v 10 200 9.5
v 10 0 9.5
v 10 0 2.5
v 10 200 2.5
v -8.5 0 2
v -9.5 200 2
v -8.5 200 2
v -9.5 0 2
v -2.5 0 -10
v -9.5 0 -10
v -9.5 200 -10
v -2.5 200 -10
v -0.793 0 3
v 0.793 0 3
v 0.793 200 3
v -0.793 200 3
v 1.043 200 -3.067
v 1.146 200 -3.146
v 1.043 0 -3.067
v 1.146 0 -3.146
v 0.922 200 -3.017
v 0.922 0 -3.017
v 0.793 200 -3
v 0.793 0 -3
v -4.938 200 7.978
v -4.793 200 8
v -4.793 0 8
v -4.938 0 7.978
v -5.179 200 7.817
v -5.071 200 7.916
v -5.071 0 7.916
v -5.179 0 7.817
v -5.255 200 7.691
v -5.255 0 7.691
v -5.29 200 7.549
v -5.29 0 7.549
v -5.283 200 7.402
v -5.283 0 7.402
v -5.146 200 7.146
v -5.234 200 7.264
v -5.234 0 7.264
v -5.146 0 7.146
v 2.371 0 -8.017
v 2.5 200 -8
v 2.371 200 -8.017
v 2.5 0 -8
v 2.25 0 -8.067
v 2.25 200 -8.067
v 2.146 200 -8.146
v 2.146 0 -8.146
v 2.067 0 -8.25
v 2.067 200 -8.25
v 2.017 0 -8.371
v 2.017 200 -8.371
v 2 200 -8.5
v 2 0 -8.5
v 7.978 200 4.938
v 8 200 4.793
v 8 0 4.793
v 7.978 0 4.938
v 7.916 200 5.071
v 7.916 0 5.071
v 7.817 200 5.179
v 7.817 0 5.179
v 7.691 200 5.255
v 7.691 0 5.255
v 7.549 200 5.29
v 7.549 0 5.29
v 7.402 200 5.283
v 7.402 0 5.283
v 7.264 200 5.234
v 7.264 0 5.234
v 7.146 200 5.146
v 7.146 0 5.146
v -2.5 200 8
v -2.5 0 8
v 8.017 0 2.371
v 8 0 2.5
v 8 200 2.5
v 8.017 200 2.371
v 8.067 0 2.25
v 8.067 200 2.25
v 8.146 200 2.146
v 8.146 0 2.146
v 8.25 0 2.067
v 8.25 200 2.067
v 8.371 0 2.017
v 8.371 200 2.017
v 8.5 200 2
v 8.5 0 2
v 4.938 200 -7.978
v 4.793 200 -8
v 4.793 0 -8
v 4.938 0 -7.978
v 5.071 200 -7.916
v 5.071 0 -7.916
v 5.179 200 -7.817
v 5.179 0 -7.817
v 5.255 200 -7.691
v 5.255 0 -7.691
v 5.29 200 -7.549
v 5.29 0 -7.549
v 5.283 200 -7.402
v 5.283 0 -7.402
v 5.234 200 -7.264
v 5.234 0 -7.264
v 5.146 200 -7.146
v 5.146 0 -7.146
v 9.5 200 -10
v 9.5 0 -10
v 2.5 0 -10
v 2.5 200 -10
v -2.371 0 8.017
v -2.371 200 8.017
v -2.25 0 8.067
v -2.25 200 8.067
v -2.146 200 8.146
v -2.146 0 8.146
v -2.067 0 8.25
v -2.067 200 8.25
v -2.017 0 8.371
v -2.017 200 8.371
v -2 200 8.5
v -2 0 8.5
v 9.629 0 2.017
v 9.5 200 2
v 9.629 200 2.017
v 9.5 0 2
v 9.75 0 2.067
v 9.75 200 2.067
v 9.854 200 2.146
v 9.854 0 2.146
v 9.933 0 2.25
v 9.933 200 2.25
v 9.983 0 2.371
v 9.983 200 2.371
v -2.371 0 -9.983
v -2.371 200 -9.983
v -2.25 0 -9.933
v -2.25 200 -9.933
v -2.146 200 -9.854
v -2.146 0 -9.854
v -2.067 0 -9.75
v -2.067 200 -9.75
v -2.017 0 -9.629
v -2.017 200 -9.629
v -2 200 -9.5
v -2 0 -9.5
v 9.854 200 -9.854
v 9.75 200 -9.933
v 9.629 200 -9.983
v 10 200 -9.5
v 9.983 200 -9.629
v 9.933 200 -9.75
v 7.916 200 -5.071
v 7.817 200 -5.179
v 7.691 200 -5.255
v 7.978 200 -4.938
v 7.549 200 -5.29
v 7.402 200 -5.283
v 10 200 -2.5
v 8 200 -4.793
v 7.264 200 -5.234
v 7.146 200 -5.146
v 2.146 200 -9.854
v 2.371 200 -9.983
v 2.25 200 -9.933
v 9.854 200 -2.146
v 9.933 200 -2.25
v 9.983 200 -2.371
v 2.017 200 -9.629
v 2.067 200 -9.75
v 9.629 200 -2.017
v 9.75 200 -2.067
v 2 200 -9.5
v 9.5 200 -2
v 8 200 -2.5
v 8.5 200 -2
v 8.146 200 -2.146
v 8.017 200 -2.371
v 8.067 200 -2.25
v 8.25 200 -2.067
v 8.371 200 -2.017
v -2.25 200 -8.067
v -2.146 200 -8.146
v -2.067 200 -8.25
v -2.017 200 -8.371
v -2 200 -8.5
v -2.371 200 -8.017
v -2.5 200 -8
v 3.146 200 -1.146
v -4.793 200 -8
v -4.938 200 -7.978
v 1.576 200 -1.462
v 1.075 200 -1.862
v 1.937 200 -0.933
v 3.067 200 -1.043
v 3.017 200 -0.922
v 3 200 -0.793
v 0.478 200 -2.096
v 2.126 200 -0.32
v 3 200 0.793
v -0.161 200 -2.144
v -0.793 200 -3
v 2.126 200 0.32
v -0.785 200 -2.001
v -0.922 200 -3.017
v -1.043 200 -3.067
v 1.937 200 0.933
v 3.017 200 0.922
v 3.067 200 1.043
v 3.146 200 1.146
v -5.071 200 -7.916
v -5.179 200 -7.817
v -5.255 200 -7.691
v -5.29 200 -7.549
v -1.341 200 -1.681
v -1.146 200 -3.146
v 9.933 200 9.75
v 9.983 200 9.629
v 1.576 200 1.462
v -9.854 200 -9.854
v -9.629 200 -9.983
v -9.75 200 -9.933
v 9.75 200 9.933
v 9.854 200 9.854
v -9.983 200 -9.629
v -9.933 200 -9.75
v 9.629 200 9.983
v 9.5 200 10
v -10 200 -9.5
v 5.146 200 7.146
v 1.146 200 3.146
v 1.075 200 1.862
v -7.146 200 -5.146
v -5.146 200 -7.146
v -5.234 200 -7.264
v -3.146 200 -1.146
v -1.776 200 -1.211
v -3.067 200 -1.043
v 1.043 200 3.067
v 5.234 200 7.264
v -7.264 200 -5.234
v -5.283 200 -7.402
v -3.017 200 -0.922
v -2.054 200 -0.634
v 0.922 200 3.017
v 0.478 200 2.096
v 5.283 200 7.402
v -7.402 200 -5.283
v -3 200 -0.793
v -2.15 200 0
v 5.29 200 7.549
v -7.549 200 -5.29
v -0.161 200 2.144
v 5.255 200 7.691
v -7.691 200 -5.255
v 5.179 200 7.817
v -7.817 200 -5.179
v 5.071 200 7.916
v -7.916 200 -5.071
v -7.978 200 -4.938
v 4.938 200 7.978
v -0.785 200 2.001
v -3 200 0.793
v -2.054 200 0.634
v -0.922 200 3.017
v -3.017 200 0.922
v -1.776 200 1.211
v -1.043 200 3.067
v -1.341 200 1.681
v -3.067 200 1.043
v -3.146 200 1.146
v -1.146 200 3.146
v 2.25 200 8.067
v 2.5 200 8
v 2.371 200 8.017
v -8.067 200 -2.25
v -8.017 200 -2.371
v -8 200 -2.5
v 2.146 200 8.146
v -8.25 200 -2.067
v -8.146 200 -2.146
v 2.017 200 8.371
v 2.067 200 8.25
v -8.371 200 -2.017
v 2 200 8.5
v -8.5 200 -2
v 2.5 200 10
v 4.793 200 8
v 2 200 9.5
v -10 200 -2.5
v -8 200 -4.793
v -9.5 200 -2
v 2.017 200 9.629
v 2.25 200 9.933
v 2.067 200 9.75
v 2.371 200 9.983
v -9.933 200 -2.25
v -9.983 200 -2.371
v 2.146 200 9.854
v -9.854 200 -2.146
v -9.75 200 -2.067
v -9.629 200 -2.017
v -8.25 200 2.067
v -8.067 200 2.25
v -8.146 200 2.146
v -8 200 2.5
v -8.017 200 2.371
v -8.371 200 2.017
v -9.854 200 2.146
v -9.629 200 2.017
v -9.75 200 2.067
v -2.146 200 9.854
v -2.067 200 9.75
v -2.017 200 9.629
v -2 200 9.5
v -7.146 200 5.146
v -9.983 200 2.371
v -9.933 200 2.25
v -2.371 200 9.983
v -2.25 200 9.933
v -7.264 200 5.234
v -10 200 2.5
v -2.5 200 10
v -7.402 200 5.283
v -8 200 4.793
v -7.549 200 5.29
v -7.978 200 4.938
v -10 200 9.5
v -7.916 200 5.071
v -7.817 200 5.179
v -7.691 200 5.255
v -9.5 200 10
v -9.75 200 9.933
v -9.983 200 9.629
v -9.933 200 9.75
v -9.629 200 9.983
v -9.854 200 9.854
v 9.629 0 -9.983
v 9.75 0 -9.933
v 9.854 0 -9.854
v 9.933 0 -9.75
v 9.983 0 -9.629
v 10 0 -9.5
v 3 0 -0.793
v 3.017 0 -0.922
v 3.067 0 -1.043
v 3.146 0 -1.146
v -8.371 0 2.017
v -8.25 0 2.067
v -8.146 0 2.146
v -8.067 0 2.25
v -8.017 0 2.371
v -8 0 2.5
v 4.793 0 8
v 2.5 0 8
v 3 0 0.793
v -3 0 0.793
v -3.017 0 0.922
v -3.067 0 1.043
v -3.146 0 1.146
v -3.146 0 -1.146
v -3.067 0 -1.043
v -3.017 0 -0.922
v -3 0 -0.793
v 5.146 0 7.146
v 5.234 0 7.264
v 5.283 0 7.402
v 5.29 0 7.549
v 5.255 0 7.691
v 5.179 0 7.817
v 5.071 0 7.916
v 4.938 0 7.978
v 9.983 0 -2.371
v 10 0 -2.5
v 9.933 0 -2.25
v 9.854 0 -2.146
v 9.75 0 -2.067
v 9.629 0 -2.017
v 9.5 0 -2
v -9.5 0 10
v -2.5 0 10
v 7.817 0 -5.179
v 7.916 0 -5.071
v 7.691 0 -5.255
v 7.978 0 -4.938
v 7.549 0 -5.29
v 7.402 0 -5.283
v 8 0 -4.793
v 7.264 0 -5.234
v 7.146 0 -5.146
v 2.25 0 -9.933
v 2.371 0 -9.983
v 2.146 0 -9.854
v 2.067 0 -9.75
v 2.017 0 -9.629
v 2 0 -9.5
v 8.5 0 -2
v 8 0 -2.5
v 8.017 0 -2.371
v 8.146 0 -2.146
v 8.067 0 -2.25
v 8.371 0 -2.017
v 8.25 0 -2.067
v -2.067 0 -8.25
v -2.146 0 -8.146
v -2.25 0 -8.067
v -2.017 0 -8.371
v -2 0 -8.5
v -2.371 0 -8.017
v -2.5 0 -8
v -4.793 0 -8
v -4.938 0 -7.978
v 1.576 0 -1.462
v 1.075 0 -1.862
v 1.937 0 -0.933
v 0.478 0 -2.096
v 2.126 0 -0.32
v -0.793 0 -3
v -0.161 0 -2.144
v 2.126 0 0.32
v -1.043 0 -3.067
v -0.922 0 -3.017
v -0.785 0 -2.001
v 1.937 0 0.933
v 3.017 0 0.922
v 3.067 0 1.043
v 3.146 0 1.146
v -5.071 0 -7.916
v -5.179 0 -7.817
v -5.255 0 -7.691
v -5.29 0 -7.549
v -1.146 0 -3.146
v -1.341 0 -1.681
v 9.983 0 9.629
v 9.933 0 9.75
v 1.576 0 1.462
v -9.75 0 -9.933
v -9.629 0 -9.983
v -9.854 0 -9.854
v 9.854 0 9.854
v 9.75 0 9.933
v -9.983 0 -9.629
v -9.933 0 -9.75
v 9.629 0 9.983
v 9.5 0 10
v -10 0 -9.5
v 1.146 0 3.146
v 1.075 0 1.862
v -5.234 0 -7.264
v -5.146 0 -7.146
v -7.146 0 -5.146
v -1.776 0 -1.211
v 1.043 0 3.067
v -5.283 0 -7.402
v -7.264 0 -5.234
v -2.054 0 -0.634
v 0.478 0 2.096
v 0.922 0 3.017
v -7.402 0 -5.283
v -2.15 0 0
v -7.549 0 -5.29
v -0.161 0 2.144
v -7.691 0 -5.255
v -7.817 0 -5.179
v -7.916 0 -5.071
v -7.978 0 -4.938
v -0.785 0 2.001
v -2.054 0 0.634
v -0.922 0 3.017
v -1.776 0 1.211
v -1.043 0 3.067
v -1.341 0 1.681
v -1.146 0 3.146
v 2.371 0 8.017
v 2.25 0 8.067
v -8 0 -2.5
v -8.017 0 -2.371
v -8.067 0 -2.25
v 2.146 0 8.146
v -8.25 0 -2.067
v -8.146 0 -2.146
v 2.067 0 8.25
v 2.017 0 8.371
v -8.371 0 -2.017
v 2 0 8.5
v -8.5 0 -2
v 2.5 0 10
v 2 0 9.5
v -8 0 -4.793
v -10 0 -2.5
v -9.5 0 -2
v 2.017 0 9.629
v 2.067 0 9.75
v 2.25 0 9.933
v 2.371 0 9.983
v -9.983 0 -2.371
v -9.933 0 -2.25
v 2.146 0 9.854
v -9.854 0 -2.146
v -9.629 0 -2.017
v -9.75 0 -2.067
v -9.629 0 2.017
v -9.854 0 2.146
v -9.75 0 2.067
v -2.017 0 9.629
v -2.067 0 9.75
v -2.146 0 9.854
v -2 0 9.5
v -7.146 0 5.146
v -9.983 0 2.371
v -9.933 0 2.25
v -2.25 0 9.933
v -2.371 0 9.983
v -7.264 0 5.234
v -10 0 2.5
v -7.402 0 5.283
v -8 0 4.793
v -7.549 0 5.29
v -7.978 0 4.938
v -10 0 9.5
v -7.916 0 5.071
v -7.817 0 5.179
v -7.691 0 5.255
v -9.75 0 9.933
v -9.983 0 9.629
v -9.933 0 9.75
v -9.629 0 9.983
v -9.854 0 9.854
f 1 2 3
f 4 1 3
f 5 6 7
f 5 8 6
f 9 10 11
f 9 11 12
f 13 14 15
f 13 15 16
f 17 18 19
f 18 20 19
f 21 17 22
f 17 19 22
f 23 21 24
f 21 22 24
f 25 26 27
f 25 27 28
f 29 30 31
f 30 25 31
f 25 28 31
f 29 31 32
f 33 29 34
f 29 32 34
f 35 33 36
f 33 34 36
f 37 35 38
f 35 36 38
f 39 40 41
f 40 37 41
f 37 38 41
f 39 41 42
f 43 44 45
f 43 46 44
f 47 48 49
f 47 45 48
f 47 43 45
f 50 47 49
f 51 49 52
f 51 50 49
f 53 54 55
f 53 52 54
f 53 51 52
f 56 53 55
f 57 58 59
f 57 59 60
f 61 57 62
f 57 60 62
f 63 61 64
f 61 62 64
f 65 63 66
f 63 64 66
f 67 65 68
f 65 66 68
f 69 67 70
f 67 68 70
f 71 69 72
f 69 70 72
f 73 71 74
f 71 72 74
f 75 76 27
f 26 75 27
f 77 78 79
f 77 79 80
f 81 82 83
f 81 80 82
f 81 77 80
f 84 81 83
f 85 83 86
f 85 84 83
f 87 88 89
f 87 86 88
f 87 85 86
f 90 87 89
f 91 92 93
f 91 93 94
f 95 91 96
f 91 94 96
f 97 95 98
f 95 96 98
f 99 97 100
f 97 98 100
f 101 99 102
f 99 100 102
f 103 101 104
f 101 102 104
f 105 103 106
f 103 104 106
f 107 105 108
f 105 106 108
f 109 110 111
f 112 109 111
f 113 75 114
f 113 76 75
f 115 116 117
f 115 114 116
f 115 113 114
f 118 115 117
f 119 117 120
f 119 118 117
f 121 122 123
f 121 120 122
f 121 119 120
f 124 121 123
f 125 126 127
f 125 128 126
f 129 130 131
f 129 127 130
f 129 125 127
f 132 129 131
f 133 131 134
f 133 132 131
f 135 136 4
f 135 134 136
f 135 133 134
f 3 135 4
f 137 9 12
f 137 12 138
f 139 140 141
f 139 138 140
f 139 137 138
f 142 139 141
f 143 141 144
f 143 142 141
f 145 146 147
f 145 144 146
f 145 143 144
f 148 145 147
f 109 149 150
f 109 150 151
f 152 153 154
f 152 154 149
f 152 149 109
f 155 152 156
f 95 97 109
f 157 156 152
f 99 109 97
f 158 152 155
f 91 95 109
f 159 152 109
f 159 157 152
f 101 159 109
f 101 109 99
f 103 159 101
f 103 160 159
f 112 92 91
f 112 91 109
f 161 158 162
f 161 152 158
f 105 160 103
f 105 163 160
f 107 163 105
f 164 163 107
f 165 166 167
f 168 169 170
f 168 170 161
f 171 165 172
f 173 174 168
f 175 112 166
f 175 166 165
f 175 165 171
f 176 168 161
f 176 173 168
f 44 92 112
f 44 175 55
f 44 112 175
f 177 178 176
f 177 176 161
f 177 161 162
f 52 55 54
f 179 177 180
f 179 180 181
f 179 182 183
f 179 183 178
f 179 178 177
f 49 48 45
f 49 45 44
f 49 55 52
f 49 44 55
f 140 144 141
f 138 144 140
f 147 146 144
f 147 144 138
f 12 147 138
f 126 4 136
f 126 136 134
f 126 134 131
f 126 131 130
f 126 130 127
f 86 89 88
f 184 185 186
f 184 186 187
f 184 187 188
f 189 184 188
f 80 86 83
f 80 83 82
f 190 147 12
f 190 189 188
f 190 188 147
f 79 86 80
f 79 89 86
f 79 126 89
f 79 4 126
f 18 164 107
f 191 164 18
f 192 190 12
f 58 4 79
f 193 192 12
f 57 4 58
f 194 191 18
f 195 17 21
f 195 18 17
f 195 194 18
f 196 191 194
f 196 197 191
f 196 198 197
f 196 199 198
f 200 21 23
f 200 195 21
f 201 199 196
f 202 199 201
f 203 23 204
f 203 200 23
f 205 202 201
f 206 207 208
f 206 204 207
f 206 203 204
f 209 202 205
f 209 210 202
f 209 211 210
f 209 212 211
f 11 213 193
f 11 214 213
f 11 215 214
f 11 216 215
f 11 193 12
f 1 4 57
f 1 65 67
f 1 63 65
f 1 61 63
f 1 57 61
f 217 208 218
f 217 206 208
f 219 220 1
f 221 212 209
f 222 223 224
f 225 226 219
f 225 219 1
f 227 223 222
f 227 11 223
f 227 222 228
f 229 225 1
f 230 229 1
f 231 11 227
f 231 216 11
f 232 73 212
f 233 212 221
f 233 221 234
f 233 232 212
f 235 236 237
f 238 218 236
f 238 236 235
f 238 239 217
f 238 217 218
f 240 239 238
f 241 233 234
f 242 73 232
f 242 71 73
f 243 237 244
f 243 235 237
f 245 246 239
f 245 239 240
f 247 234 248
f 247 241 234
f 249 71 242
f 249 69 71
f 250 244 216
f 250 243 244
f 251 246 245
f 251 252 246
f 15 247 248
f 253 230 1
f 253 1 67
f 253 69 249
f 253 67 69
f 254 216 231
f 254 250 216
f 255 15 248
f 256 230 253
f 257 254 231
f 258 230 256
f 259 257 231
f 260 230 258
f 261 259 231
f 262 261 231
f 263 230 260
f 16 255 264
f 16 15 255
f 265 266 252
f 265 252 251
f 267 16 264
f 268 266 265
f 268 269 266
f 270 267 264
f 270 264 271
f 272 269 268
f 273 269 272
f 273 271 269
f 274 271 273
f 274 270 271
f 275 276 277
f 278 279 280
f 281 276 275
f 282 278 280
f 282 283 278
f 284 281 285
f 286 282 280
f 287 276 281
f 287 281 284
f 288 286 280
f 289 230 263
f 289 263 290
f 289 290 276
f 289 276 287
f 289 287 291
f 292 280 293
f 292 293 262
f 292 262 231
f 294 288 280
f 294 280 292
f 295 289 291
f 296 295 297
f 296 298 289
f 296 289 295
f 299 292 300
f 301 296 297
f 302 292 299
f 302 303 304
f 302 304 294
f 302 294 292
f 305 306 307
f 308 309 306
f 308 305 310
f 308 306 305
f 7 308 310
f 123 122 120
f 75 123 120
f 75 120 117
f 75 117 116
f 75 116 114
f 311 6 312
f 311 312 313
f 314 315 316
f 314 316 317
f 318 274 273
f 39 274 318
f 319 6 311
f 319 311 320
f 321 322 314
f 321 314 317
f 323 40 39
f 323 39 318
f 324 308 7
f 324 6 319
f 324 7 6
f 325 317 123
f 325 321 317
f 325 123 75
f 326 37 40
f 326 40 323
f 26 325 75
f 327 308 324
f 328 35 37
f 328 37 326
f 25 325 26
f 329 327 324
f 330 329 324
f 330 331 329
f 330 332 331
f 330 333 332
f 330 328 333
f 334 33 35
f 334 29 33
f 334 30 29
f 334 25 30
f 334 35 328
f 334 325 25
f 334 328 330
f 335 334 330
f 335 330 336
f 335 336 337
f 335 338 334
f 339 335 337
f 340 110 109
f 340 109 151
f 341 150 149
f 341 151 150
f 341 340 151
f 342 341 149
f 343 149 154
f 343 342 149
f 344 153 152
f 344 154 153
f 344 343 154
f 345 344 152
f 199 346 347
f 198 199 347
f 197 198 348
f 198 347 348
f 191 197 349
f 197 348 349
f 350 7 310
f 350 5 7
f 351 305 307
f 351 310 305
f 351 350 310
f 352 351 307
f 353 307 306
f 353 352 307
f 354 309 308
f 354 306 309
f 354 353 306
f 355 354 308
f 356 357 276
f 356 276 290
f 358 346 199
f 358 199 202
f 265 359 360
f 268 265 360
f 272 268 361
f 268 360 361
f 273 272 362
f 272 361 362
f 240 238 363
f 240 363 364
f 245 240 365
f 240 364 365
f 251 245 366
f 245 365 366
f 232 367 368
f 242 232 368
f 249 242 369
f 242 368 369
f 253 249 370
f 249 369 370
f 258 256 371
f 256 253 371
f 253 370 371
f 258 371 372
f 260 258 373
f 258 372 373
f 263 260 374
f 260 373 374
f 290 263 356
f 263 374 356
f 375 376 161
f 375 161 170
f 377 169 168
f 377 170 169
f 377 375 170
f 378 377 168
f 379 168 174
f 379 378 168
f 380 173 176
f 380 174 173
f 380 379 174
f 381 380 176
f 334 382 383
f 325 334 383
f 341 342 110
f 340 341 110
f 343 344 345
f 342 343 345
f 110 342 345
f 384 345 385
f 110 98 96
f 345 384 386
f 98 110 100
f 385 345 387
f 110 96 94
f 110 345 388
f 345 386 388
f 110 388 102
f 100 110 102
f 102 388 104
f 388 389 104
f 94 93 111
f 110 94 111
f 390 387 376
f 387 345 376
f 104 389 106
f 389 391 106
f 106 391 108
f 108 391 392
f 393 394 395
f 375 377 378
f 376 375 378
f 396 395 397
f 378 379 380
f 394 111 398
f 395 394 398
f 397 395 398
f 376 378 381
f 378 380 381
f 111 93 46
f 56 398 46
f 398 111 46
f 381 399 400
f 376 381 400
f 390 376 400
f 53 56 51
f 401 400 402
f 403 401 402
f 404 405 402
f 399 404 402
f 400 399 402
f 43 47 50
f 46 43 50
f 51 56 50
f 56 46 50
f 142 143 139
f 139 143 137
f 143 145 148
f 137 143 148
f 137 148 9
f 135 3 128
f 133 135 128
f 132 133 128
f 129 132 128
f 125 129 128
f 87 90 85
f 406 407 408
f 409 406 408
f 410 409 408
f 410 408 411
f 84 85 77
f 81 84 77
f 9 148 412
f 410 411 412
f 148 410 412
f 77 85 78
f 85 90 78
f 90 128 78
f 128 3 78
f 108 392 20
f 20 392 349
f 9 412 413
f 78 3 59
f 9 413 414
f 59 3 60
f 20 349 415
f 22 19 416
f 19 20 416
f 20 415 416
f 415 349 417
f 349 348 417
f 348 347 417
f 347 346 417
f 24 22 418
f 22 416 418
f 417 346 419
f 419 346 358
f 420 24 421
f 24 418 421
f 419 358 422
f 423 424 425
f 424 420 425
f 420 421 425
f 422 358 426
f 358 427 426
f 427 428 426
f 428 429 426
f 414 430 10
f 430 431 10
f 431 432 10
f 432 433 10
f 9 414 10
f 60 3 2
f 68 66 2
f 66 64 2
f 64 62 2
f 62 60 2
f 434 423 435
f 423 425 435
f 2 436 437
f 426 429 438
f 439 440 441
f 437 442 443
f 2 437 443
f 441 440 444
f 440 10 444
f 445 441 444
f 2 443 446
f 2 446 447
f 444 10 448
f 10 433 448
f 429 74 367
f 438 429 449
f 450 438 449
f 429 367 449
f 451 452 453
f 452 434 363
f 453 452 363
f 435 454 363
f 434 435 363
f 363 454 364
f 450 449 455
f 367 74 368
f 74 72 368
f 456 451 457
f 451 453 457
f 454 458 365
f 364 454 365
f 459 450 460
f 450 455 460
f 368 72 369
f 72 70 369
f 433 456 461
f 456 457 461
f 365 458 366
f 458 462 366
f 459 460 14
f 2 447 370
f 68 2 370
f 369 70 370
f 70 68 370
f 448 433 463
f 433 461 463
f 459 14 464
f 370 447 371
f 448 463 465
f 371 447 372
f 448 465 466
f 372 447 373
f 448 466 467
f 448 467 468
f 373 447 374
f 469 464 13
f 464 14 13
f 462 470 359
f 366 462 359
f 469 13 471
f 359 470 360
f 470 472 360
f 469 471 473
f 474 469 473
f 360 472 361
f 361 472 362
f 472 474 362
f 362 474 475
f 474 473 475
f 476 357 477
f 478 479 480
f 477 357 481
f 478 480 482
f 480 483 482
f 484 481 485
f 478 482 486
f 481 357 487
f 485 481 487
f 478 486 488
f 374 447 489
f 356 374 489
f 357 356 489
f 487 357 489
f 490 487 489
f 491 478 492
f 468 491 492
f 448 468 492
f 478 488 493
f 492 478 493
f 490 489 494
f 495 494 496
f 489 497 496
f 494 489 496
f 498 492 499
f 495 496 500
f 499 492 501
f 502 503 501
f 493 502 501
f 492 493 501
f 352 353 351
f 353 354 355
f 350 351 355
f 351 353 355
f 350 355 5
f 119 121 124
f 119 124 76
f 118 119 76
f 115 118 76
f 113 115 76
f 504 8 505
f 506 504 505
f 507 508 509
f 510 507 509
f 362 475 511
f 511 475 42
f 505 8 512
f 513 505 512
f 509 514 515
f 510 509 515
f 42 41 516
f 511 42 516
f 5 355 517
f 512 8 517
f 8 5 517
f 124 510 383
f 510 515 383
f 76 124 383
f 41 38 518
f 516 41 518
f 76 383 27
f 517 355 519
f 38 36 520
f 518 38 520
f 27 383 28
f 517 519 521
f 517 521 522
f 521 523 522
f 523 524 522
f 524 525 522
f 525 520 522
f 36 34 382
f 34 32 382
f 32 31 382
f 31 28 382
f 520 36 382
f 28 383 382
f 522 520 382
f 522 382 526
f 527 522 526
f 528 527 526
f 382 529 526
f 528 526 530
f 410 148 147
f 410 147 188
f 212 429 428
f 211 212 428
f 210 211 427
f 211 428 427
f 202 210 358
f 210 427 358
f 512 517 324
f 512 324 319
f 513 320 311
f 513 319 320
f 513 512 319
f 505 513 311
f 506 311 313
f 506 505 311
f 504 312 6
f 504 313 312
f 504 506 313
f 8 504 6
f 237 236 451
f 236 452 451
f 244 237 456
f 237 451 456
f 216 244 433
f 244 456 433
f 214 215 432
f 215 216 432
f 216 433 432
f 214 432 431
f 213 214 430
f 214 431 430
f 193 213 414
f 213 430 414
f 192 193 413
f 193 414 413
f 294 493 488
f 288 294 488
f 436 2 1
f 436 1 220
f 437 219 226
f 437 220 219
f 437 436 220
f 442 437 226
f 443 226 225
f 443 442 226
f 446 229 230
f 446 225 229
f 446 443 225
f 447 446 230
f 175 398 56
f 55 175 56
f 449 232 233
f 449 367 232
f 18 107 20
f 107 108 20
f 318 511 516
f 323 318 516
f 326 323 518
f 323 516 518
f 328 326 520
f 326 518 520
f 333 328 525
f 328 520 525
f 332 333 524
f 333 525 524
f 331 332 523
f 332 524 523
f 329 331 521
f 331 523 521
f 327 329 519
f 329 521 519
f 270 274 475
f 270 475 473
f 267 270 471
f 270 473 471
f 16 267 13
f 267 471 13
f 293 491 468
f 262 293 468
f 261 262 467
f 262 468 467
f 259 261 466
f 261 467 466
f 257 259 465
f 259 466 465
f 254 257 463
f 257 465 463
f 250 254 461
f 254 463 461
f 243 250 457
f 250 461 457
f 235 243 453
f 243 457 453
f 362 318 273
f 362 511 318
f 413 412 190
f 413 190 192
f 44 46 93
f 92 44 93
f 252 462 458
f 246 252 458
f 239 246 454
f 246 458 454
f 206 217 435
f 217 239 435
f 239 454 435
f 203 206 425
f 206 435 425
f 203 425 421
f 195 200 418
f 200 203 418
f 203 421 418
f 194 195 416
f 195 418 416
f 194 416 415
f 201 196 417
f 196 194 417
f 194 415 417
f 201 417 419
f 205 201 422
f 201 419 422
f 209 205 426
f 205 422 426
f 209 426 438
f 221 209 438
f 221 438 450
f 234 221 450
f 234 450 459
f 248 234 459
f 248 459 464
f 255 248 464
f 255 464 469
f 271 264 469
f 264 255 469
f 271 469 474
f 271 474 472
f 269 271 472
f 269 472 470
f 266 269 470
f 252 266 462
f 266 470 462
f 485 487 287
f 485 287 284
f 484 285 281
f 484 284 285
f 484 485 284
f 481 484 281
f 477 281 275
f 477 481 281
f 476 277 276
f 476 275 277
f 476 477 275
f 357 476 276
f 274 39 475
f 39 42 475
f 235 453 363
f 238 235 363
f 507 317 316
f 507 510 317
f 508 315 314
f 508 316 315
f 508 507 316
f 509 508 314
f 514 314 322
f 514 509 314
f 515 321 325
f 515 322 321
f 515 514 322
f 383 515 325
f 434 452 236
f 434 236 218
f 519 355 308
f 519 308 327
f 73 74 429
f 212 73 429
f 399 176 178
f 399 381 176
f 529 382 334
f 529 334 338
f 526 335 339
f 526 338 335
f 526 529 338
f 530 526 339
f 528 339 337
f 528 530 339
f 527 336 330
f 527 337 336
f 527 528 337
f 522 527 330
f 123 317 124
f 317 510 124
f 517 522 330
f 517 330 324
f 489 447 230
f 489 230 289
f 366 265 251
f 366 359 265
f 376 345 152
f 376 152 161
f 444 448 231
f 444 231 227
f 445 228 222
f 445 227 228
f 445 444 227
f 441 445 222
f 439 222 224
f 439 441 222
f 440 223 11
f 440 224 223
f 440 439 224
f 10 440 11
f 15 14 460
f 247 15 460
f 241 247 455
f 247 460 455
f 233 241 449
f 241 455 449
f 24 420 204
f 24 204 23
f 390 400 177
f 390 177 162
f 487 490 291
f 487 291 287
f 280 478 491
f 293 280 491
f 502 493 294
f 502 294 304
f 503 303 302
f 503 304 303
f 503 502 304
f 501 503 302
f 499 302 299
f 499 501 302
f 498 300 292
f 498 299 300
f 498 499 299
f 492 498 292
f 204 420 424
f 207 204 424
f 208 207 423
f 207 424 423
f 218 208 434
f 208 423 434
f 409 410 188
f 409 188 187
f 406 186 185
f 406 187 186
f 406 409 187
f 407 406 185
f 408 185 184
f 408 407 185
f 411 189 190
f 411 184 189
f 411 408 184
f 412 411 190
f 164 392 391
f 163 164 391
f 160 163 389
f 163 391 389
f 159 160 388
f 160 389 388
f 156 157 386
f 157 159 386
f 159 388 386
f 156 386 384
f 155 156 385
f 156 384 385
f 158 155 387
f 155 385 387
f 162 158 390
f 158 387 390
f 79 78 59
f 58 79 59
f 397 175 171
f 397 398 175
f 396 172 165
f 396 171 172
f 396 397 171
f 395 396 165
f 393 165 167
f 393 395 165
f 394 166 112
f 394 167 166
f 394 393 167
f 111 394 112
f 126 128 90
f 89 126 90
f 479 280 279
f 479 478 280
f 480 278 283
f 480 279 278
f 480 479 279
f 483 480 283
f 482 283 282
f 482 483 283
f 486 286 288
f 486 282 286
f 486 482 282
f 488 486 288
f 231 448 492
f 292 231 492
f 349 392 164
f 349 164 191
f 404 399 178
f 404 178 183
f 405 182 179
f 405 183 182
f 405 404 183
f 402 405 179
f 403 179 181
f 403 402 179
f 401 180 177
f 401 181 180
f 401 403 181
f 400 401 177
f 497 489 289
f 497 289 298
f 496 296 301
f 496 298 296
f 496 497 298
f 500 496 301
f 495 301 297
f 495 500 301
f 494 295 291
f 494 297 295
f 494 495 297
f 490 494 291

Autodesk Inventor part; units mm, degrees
ref_plane "YZ Plane" through (0, 0, 0) normal (1, 0, 0) x (0, 1, 0)
ref_plane "XZ Plane" through (0, 0, 0) normal (0, 1, 0) x (-1, 0, 0)
ref_plane "XY Plane" through (0, 0, 0) normal (0, 0, 1) x (1, 0, 0)
sketch "Sketch1" plane through (0, 0, 0) normal (0, 1, 0) x (-1, 0, 0)
  line L0 (2.5, 10) -> (9.5, 10) construction
  line L1 (10, -2.5) -> (10, -9.5) construction
  line L2 (-2.5, -10) -> (-9.5, -10) construction
  line L3 (-10, 2.5) -> (-10, 10) construction
  line L4 (-10, 10) -> (10, -10) construction
  line L5 (10, 10) -> (-10, -10) construction
  circle A0 centre (0, 0) radius 2.15
  line L6 (10, 9.5) -> (10, 2.5)
  line L7 (9.5, 2) -> (8.5, 2)
  line L8 (8, 2.5) -> (8, 4.7929)
  line L9 (-0.7929, 3) -> (0.7929, 3)
  line L10 (3, 0.7929) -> (3, -0.7929)
  line L11 (0.7929, -3) -> (-0.7929, -3)
  line L12 (-3, -0.7929) -> (-3, 0.7929)
  line L13 (-3, 3) -> (3, -3) construction
  line L14 (3, 3) -> (-3, -3) construction
  line L15 (10, -10) -> (10, -2)
  line L16 (9.5, -2) -> (8.5, -2)
  line L17 (8, -2.5) -> (8, -4.7929)
  line L18 (7.1464, -5.1464) -> (3.1464, -1.1464)
  line L19 (7.1464, 5.1464) -> (3.1464, 1.1464)
  line L20 (8, 6) -> (13.6569, 6) construction
  line L21 (10, 10) -> (2, 10)
  line L22 (2, 9.5) -> (2, 8.5)
  line L23 (2.5, 8) -> (4.7929, 8)
  line L24 (5.1464, 7.1464) -> (1.1464, 3.1464)
  line L25 (-9.5, 10) -> (-2.5, 10)
  line L26 (-2, 9.5) -> (-2, 8.5)
  line L27 (-2.5, 8) -> (-4.7929, 8)
  line L28 (-5.1464, 7.1464) -> (-1.1464, 3.1464)
  line L29 (-10, 9.5) -> (-10, 2)
  line L30 (-9.5, 2) -> (-8.5, 2)
  line L31 (-8, 2.5) -> (-8, 4.7929)
  line L32 (-7.1464, 5.1464) -> (-3.1464, 1.1464)
  line L33 (-10, -9.5) -> (-10, -2.5)
  line L34 (-9.5, -2) -> (-8.5, -2)
  line L35 (-8, -2.5) -> (-8, -4.7929)
  line L36 (-7.1464, -5.1464) -> (-3.1464, -1.1464)
  line L37 (-8, -6) -> (-2.3431, -6) construction
  line L38 (-10, -10) -> (-2, -10)
  line L39 (-2, -9.5) -> (-2, -8.5)
  line L40 (-2.5, -8) -> (-4.7929, -8)
  line L41 (-5.1464, -7.1464) -> (-1.1464, -3.1464)
  line L42 (9.5, -10) -> (2.5, -10)
  line L43 (2, -9.5) -> (2, -8.5)
  line L44 (2.5, -8) -> (4.7929, -8)
  line L45 (5.1464, -7.1464) -> (1.1464, -3.1464)
  arc A1 (8, 2.5) -> (8.5, 2) centre (8.5, 2.5) ccw
  arc A2 (9.5, 2) -> (10, 2.5) centre (9.5, 2.5) ccw
  arc A3 (10, -2.5) -> (9.5, -2) centre (9.5, -2.5) ccw
  arc A4 (8.5, -2) -> (8, -2.5) centre (8.5, -2.5) ccw
  arc A5 (7.1464, -5.1464) -> (8, -4.7929) centre (7.5, -4.7929) ccw
  arc A6 (3, -0.7929) -> (3.1464, -1.1464) centre (3.5, -0.7929) ccw
  arc A7 (3.1464, 1.1464) -> (3, 0.7929) centre (3.5, 0.7929) ccw
  arc A8 (8, 4.7929) -> (7.1464, 5.1464) centre (7.5, 4.7929) ccw
  arc A9 (5.1464, 7.1464) -> (4.7929, 8) centre (4.7929, 7.5) ccw
  arc A10 (0.7929, 3) -> (1.1464, 3.1464) centre (0.7929, 3.5) ccw
  arc A11 (-1.1464, 3.1464) -> (-0.7929, 3) centre (-0.7929, 3.5) ccw
  arc A12 (-3, 0.7929) -> (-3.1464, 1.1464) centre (-3.5, 0.7929) ccw
  arc A13 (-3.1464, -1.1464) -> (-3, -0.7929) centre (-3.5, -0.7929) ccw
  arc A14 (-0.7929, -3) -> (-1.1464, -3.1464) centre (-0.7929, -3.5) ccw
  arc A15 (1.1464, -3.1464) -> (0.7929, -3) centre (0.7929, -3.5) ccw
  arc A16 (-4.7929, 8) -> (-5.1464, 7.1464) centre (-4.7929, 7.5) ccw
  arc A17 (-7.1464, 5.1464) -> (-8, 4.7929) centre (-7.5, 4.7929) ccw
  arc A18 (-8, -4.7929) -> (-7.1464, -5.1464) centre (-7.5, -4.7929) ccw
  arc A19 (-5.1464, -7.1464) -> (-4.7929, -8) centre (-4.7929, -7.5) ccw
  arc A20 (4.7929, -8) -> (5.1464, -7.1464) centre (4.7929, -7.5) ccw
  arc A21 (2, 8.5) -> (2.5, 8) centre (2.5, 8.5) ccw
  arc A22 (2.5, 10) -> (2, 9.5) centre (2.5, 9.5) ccw
  arc A23 (-2, 9.5) -> (-2.5, 10) centre (-2.5, 9.5) ccw
  arc A24 (-2.5, 8) -> (-2, 8.5) centre (-2.5, 8.5) ccw
  arc A25 (-10, 2.5) -> (-9.5, 2) centre (-9.5, 2.5) ccw
  arc A26 (-8.5, 2) -> (-8, 2.5) centre (-8.5, 2.5) ccw
  arc A27 (-8, -2.5) -> (-8.5, -2) centre (-8.5, -2.5) ccw
  arc A28 (-9.5, -2) -> (-10, -2.5) centre (-9.5, -2.5) ccw
  arc A29 (-2.5, -10) -> (-2, -9.5) centre (-2.5, -9.5) ccw
  arc A30 (-2, -8.5) -> (-2.5, -8) centre (-2.5, -8.5) ccw
  arc A31 (2, -9.5) -> (2.5, -10) centre (2.5, -9.5) ccw
  arc A32 (2.5, -8) -> (2, -8.5) centre (2.5, -8.5) ccw
  arc A33 (9.5, -10) -> (10, -9.5) centre (9.5, -9.5) ccw
  arc A34 (10, 9.5) -> (9.5, 10) centre (9.5, 9.5) ccw
  arc A35 (-9.5, 10) -> (-10, 9.5) centre (-9.5, 9.5) ccw
  arc A36 (-10, -9.5) -> (-9.5, -10) centre (-9.5, -9.5) ccw
  point P0 (10, 2)
  point P1 (8, 2)
  point P2 (8, -2)
  point P3 (8, -6)
  point P4 (2, 8)
  point P5 (6, 8)
  point P6 (-2, 10)
  point P7 (-2, 8)
  point P8 (-6, 8)
  point P9 (-8, 2)
  point P10 (-8, 6)
  point P11 (-10, -2)
  point P12 (-8, -2)
  point P13 (-2, -8)
  point P14 (-6, -8)
  point P15 (2, -10)
  point P16 (2, -8)
  point P17 (6, -8)
  point P18 (1, 3)
  point P19 (3, 1)
  point P20 (3, -1)
  point P21 (1, -3)
  point P22 (-1, -3)
  point P23 (-3, -1)
  point P24 (-3, 1)
  point P25 (-1, 3)
  dimension "d0" = 20
  dimension "d1" = 20
  dimension "d2" = 4.3
  dimension "d3" = 8
  dimension "d4" = 2
  dimension "d5" = 4
  dimension "d6" = 6
  dimension "d7" = 6
  dimension "d8" = 8
  dimension "d9" = 2
  dimension "d10" = 4
  dimension "d11" = 45
  dimension "d12" = 135
  dimension "d13" = 8
  dimension "d14" = 2
  dimension "d15" = 4
  dimension "d16" = 45
  dimension "d17" = 8
  dimension "d18" = 2
  dimension "d19" = 4
  dimension "d20" = 45
  dimension "d21" = 8
  dimension "d22" = 2
  dimension "d23" = 4
  dimension "d24" = 45
  dimension "d25" = 8
  dimension "d26" = 2
  dimension "d27" = 4
  dimension "d28" = 45
  dimension "d29" = 8
  dimension "d30" = 2
  dimension "d31" = 4
  dimension "d32" = 45
  dimension "d33" = 8
  dimension "d34" = 2
  dimension "d35" = 4
  dimension "d36" = 45
  dimension "d37" = 2
  dimension "d38" = 2
  dimension "d39" = 2
  dimension "d40" = 2
  dimension "d41" = 0.5
extrude "Extrusion1" add sketch "Sketch1" along normal blind 200
properties part number "Strut_short"
